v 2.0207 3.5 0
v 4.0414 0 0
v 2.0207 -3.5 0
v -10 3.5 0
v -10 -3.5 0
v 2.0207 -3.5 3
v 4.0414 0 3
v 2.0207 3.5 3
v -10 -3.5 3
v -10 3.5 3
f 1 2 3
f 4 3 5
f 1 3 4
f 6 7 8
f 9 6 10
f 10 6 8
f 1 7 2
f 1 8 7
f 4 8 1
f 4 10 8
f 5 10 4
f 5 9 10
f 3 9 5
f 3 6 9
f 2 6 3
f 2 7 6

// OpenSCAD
Debug=false;

module bolt_trace(width=10, length=7, thickness=3)
{
	d = length/(2*cos(30));
		
	if (Debug) {
		color([1,0,0,0.3])
		rotate([0,0,0*60])
		cube([length,length,2],center=true);
	}

	linear_extrude(thickness)
	polygon([
	    [0,length/2],
	    [cos(60)*d, sin(60)*d],
	    [cos(0)*d, sin(0)*d],
	    [cos(-60)*d, sin(-60)*d],
	    [0,-length/2],
	    [-width,-length/2],
	    [-width,length/2]
	]);
}

bolt_trace();
